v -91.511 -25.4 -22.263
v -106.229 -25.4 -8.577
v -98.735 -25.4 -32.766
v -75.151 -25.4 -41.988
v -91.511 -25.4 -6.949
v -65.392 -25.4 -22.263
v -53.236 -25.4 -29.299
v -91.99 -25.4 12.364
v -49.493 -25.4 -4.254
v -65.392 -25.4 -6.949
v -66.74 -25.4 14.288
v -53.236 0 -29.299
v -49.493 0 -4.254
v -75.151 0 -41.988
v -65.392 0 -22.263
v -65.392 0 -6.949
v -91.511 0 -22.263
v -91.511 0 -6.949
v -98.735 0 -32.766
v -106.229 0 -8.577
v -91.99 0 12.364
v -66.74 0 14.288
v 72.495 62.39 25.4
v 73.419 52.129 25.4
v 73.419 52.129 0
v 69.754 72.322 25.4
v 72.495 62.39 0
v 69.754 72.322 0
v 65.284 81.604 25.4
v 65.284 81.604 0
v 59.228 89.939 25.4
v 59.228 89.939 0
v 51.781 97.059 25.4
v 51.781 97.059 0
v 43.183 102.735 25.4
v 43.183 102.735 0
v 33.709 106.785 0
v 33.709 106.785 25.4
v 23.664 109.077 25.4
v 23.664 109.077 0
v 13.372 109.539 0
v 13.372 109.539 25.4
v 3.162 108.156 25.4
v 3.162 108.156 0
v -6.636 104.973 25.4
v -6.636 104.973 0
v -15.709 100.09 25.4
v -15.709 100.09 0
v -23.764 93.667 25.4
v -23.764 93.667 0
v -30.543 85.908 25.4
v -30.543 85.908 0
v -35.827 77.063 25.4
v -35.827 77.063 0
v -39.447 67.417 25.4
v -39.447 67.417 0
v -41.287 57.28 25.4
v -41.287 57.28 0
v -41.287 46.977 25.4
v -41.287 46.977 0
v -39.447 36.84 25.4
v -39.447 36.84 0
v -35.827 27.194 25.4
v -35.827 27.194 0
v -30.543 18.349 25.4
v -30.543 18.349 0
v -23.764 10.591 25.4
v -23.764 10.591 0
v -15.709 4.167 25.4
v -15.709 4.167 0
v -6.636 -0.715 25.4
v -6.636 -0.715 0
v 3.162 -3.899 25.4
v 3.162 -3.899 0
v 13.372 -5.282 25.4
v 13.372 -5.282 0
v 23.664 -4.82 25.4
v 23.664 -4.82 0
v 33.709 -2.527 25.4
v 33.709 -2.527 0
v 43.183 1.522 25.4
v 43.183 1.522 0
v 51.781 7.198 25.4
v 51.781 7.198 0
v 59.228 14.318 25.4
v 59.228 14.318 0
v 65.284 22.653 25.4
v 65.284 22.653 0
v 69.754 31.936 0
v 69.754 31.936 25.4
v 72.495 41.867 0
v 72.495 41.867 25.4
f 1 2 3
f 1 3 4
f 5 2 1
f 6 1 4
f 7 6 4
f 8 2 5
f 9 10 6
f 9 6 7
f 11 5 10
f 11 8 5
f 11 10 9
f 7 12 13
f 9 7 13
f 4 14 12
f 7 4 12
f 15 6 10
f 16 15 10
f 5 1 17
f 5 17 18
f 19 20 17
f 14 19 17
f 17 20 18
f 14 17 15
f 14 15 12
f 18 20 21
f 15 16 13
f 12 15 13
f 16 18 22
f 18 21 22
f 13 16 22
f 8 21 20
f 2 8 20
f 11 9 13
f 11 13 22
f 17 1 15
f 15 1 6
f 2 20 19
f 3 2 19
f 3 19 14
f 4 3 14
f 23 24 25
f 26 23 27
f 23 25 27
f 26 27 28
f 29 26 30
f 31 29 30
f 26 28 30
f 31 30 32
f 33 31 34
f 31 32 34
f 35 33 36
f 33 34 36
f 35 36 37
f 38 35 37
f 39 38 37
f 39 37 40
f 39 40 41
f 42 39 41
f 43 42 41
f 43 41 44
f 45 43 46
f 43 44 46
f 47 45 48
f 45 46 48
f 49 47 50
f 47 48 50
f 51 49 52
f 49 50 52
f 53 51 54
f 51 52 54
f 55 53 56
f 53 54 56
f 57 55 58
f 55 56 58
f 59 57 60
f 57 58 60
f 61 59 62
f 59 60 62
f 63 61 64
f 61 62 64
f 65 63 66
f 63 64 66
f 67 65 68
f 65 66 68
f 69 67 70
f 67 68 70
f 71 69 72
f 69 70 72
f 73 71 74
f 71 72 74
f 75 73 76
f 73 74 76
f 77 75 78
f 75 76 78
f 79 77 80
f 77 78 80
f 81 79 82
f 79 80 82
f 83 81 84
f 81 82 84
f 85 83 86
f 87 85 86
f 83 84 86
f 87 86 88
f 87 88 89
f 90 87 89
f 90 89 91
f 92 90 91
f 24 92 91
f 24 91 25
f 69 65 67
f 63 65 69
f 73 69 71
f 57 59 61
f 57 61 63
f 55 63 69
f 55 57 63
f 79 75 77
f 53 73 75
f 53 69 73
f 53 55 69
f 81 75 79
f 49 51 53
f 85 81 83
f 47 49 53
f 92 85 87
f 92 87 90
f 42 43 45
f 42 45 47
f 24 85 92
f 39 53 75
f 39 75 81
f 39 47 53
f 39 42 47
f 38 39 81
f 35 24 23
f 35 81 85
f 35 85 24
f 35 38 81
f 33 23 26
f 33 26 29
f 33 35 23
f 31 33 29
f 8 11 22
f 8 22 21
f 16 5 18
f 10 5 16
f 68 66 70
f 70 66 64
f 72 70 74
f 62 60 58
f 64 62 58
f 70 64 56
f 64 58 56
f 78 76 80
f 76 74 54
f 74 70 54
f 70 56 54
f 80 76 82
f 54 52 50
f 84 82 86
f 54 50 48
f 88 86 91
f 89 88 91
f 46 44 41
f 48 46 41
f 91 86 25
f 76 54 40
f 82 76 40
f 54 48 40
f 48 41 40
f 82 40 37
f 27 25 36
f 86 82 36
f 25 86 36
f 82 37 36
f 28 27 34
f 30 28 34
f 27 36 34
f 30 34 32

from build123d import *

# Parameters (mm, degrees)
F1_DEPTH = 25.4
F2_W     = 26.118561
F2_H     = 15.313957
F3_DEPTH = 25.401
F4_R     = 57.4686
F5_DEPTH = 25.4


with BuildPart() as f1:
    # F0 (on Front) → F1 (new body)
    with BuildSketch(Plane.XZ):
        Polygon((-49.492922, -4.253941), (-66.740099, 14.287735), (-91.990003, 12.363895), (-106.228943, -8.57677), (-98.734705, -32.765512), (-75.150605, -41.987715), (-53.23595, -29.298872), align=None)
    extrude(amount=F1_DEPTH)

    # F2 (on face) → F3 (cut, through all)
    with BuildSketch(Plane.XZ.offset(25.4)):
        with Locations((-78.451499, -14.605688)):
            Rectangle(F2_W, F2_H)
    extrude(amount=-F3_DEPTH, mode=Mode.SUBTRACT)


with BuildPart() as f5:
    # F4 (on Top) → F5 (new body)
    with BuildSketch(Plane.XY):
        with Locations((15.950277, 52.128647)):
            Circle(F4_R)
    extrude(amount=F5_DEPTH)


solid = Compound([f1.part, f5.part])
